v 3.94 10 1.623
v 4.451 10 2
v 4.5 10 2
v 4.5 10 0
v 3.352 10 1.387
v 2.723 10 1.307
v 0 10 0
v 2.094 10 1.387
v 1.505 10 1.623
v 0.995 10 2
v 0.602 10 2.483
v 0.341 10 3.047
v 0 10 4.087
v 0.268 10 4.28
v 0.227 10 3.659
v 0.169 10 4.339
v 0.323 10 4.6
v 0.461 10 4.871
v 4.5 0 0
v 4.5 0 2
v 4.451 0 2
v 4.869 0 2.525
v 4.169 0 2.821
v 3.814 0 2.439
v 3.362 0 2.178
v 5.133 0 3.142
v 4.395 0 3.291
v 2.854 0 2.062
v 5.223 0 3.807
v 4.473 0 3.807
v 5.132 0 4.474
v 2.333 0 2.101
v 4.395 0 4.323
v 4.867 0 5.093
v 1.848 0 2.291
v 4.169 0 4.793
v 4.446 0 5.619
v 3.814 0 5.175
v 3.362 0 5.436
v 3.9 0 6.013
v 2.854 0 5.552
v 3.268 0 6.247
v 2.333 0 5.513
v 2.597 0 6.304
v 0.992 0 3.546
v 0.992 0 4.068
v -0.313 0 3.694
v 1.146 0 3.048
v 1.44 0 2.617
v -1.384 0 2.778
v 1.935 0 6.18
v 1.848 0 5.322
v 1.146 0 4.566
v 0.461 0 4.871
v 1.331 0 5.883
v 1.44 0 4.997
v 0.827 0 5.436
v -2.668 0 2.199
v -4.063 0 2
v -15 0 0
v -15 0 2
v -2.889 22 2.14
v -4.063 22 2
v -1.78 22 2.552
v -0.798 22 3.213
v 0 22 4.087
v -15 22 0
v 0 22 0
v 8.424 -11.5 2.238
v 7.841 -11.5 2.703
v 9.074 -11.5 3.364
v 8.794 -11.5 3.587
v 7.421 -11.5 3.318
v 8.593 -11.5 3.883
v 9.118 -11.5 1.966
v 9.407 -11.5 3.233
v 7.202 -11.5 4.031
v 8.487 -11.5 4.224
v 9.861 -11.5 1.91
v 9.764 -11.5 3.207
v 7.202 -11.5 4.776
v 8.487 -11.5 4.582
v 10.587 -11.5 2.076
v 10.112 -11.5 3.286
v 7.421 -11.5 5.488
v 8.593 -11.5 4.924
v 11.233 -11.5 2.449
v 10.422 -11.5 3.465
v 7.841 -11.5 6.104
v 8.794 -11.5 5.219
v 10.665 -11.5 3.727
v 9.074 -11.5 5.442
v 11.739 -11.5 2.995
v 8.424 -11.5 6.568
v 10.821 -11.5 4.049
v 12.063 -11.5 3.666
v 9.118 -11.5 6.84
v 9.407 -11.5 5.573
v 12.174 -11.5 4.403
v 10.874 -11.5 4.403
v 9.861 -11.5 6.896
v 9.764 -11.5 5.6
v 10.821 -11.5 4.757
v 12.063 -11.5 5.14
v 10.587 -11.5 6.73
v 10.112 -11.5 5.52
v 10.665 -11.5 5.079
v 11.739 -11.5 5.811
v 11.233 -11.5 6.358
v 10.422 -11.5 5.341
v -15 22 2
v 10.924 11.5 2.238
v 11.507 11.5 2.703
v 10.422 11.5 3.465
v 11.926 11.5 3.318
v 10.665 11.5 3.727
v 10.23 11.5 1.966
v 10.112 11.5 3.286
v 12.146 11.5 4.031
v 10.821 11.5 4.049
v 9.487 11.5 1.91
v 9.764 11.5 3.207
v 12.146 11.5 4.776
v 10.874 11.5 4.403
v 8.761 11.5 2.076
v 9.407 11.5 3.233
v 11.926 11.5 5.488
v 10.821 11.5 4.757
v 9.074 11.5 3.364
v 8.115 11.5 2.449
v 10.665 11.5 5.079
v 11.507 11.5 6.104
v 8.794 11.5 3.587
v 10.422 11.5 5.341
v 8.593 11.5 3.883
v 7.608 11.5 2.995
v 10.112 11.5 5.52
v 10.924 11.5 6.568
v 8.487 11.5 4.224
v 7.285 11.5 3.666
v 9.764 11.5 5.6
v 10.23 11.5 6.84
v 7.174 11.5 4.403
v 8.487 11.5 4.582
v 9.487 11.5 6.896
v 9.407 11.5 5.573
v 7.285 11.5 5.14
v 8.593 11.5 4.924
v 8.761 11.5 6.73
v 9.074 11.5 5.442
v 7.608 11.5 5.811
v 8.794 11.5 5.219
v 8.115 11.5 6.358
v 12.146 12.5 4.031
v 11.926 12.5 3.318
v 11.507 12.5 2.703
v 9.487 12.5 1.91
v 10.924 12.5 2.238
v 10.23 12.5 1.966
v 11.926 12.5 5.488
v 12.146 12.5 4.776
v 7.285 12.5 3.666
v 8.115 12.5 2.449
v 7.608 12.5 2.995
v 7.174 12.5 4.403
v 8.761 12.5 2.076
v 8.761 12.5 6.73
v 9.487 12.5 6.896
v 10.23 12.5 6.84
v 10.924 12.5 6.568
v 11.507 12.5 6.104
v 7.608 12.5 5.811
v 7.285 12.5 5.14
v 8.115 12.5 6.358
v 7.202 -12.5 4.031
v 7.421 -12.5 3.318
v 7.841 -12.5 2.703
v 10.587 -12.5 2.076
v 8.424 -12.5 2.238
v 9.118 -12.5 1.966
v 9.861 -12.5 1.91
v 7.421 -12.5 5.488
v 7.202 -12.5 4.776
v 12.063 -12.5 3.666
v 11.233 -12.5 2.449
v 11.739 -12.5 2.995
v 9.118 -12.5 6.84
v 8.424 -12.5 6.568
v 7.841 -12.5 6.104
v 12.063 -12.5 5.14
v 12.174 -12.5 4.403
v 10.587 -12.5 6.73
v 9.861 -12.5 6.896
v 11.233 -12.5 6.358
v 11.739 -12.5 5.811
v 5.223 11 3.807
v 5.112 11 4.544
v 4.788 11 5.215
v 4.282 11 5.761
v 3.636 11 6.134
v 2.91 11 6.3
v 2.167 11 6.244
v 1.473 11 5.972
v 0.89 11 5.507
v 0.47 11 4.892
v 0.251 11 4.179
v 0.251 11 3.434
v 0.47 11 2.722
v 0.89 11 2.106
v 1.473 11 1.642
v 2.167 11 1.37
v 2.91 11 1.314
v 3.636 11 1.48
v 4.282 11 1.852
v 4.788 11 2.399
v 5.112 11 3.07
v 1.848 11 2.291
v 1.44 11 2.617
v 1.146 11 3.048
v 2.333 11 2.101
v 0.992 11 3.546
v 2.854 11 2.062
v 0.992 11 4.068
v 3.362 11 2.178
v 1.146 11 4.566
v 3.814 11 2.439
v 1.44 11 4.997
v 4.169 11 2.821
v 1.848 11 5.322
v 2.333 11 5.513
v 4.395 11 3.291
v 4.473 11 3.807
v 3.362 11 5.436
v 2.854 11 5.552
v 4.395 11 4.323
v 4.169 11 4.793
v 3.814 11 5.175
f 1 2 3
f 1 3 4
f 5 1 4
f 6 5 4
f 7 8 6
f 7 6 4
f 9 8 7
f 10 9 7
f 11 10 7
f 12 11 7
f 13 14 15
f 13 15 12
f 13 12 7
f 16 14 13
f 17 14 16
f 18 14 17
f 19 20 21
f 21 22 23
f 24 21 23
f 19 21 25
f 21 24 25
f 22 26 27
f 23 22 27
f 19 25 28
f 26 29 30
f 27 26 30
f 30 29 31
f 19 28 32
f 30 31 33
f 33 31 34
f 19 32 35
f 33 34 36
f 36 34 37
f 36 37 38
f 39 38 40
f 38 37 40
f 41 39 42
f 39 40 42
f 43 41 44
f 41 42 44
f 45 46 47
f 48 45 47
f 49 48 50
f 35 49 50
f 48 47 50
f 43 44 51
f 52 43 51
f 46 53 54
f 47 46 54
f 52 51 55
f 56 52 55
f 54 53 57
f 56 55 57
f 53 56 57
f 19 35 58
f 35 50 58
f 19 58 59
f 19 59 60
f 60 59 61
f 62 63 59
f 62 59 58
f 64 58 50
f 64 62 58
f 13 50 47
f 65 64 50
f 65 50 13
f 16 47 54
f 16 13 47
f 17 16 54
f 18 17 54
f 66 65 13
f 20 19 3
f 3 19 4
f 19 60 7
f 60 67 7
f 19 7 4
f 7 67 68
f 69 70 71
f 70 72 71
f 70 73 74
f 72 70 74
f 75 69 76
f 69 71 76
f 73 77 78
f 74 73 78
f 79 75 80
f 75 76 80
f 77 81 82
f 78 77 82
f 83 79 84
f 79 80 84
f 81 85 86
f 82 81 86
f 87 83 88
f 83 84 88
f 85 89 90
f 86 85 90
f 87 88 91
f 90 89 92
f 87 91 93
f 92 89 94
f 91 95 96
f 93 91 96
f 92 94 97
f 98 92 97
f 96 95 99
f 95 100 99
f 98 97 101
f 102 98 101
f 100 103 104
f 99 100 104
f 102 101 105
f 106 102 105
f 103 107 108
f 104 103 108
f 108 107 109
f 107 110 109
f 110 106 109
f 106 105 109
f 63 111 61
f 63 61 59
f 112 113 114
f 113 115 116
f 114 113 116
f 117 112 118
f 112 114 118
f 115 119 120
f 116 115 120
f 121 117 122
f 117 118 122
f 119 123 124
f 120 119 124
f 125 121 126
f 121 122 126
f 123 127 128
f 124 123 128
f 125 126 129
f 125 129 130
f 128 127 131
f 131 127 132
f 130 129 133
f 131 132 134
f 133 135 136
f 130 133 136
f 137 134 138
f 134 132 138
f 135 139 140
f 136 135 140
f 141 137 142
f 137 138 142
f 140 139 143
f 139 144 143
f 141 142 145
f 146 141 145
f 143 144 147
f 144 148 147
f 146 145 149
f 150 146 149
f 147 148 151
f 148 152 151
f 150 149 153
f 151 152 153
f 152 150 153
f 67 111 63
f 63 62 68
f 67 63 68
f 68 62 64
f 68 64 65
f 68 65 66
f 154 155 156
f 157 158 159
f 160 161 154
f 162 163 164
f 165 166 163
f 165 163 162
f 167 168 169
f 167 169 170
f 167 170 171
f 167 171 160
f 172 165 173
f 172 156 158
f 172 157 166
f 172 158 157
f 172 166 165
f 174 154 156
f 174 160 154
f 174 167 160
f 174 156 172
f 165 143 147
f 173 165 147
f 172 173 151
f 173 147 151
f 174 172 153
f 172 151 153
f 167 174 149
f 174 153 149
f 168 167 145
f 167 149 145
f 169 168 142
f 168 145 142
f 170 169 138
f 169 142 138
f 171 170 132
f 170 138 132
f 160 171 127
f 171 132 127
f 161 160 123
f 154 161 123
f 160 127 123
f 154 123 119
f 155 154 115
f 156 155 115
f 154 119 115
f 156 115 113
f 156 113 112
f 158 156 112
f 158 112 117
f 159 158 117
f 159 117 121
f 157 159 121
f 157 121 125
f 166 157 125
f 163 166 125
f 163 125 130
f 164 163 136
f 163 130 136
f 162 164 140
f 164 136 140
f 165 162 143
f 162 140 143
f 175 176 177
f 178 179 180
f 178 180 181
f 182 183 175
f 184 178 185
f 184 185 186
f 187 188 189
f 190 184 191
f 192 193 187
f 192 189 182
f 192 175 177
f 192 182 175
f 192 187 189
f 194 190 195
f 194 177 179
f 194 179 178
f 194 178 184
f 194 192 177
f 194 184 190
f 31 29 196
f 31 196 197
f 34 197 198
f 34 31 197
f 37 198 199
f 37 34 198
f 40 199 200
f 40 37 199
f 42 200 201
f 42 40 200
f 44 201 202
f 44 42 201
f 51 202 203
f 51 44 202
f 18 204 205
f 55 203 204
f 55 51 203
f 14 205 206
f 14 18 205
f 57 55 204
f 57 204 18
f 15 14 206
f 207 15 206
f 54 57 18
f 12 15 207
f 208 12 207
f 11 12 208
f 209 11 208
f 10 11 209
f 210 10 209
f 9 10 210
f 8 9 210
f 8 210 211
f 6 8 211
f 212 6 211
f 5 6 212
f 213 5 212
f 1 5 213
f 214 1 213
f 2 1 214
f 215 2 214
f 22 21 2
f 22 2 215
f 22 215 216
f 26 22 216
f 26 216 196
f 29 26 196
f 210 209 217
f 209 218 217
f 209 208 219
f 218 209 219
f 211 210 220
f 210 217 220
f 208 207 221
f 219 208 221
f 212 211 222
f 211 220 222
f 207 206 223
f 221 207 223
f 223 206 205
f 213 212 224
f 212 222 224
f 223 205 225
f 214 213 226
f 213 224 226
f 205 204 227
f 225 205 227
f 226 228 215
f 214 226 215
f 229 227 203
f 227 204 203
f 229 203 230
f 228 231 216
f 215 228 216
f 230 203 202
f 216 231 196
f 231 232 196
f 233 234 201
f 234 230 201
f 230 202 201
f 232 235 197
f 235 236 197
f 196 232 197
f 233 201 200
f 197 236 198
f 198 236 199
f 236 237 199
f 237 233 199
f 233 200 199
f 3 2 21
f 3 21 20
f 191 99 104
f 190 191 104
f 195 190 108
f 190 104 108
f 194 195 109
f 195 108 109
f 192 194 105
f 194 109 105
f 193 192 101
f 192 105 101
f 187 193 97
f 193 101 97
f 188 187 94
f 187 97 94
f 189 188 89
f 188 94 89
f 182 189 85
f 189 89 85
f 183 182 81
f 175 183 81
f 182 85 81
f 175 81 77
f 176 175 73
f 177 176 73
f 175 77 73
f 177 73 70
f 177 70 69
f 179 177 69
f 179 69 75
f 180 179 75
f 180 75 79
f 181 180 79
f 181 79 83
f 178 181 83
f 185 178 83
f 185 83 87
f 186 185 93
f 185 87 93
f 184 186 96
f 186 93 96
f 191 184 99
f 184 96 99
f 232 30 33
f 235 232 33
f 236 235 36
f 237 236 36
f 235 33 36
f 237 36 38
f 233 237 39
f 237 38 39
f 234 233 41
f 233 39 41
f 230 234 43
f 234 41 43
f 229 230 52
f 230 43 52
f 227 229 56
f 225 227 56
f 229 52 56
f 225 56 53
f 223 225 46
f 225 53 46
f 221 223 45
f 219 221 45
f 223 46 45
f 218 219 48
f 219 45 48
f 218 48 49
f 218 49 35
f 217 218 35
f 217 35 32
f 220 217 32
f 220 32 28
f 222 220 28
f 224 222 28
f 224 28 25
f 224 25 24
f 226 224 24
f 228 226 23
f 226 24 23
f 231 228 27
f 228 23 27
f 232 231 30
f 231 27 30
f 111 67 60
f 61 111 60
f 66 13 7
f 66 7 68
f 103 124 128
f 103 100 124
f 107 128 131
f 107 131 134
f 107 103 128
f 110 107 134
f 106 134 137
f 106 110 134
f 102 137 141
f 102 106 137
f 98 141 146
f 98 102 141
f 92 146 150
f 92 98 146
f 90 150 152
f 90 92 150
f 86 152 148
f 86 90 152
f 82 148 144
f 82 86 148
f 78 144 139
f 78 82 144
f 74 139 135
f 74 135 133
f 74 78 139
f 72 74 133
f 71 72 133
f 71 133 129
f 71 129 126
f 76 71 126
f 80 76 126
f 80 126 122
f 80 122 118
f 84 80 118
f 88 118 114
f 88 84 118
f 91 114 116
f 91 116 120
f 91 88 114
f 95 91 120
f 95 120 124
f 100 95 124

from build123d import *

# Parameters (mm, degrees)
F0_W         = 4.5
F0_H         = 10
F1_DEPTH     = 2
F2_R         = 2.5
F2_R_2       = 1.75
F3_DEPTH     = 11
F4_T4_DEPTH  = 22.646276463
F4_T11_DEPTH = 22.646276463
F4_T18_DEPTH = 10
F4_T23_DEPTH = 10
F5_R         = 1.2
F6_DEPTH     = 11.5
F7_R         = 2.5
F8_DEPTH     = 1
F9_R         = 2.5
F10_DEPTH    = 1


# Not quite as in the source:
# - a fillet or chamfer that OpenCascade refuses, or shapes differently, is made with other operations: its cross-section is extruded or revolved along the edge and cut away or added


with BuildPart() as f1:
    # F0 (on Top) → F1 (new body)
    with BuildSketch(Plane.XY):
        Polygon((-15, 0), (0, 0), (0, 10), (0, 22), (-15, 22), align=None)
        with Locations((2.25, 5)):
            Rectangle(F0_W, F0_H)
    extrude(amount=F1_DEPTH)

    # F2 (on Front) → F3 (join)
    with BuildSketch(Plane.XZ):
        with Locations((2.7228465769, 3.8068606518)):
            Circle(F2_R)
        with Locations((2.7228465769, 3.8068606518)):
            Circle(F2_R_2, mode=Mode.SUBTRACT)
    extrude(amount=-F3_DEPTH)

    # F4: fillet of radius 5 on 1 edges, made by hand


with BuildPart() as f4_tool2:
    # F4_s3 → F4_t4 (new body)
    with BuildSketch(Plane.XZ.offset(-22.646276463)):
        with BuildLine():
            ThreePointArc((-4.0634529377, 2), (-1.3842550939, 2.7784009056), (0.4607467387, 4.8712404345))
            ThreePointArc((0.4607467387, 4.8712404345), (0.2650409494, 3.3494860821), (0.9950576474, 2))
            Line((0.9950576474, 2), (-4.0634529377, 2))
        make_face()
    extrude(amount=F4_T4_DEPTH)

    split(bisect_by=Plane.XZ.offset(-22), keep=Keep.TOP)

    split(bisect_by=Plane.YZ, keep=Keep.BOTTOM)

    split(bisect_by=Plane.XZ.offset(-11), keep=Keep.BOTTOM)


with BuildPart() as f1_1:
    add(f1.part)

    # F4_t1: union F4_tool2
    add(f4_tool2.part)


with BuildPart() as f4_tool9:
    # F4_s10 → F4_t11 (new body)
    with BuildSketch(Plane.XZ.offset(-22.646276463)):
        with BuildLine():
            ThreePointArc((-4.0634529377, 2), (-1.3842550939, 2.7784009056), (0.4607467387, 4.8712404345))
            ThreePointArc((0.4607467387, 4.8712404345), (0.2650409494, 3.3494860821), (0.9950576474, 2))
            Line((0.9950576474, 2), (-4.0634529377, 2))
        make_face()
    extrude(amount=F4_T11_DEPTH)

    split(bisect_by=Plane.YZ, keep=Keep.BOTTOM)

    split(bisect_by=Plane.XZ.offset(-10), keep=Keep.BOTTOM)

    split(bisect_by=Plane.XZ.offset(-11), keep=Keep.TOP)


with BuildPart() as f1_2:
    add(f1_1.part)

    # F4_t8: union F4_tool9
    add(f4_tool9.part)


with BuildPart() as f4_tool16:
    # F4_s17 → F4_t18 (new body)
    with BuildSketch(Plane.XZ.offset(-10)):
        with BuildLine():
            ThreePointArc((-4.0634529377, 2), (-1.3842550939, 2.7784009056), (0.4607467387, 4.8712404345))
            ThreePointArc((0.4607467387, 4.8712404345), (0.2650409494, 3.3494860821), (0.9950576474, 2))
            Line((0.9950576474, 2), (-4.0634529377, 2))
        make_face()
    extrude(amount=F4_T18_DEPTH)

    split(bisect_by=Plane.YZ, keep=Keep.BOTTOM)


with BuildPart() as f1_3:
    add(f1_2.part)

    # F4_t15: union F4_tool16
    add(f4_tool16.part)


with BuildPart() as f4_tool21:
    # F4_s22 → F4_t23 (new body)
    with BuildSketch(Plane.XZ.offset(-10)):
        with BuildLine():
            ThreePointArc((-4.0634529377, 2), (-1.3842550939, 2.7784009056), (0.4607467387, 4.8712404345))
            ThreePointArc((0.4607467387, 4.8712404345), (0.2650409494, 3.3494860821), (0.9950576474, 2))
            Line((0.9950576474, 2), (-4.0634529377, 2))
        make_face()
    extrude(amount=F4_T23_DEPTH)

    split(bisect_by=Plane.YZ, keep=Keep.TOP)


with BuildPart() as f1_4:
    add(f1_3.part)

    # F4_t20: union F4_tool21
    add(f4_tool21.part)


with BuildPart() as f6:
    # F5 (on Front) → F6 (new body, symmetric)
    with BuildSketch(Plane.XZ):
        with Locations((9.6738887951, 4.4031692669)):
            Circle(F5_R)
    extrude(amount=F6_DEPTH, both=True)

    # F7 (on face) → F8 (join)
    with BuildSketch(Plane(origin=(0, 11.5, 0), x_dir=(-1, 0, 0), z_dir=(0, 1, 0))):
        with Locations((-9.6738887951, 4.4031692669)):
            Circle(F7_R)
    extrude(amount=F8_DEPTH)

    # F9 (on face) → F10 (join)
    with BuildSketch(Plane.XZ.offset(11.5)):
        with Locations((9.6738887951, 4.4031692669)):
            Circle(F9_R)
    extrude(amount=F10_DEPTH)


solid = Compound([f1_4.part, f6.part])
